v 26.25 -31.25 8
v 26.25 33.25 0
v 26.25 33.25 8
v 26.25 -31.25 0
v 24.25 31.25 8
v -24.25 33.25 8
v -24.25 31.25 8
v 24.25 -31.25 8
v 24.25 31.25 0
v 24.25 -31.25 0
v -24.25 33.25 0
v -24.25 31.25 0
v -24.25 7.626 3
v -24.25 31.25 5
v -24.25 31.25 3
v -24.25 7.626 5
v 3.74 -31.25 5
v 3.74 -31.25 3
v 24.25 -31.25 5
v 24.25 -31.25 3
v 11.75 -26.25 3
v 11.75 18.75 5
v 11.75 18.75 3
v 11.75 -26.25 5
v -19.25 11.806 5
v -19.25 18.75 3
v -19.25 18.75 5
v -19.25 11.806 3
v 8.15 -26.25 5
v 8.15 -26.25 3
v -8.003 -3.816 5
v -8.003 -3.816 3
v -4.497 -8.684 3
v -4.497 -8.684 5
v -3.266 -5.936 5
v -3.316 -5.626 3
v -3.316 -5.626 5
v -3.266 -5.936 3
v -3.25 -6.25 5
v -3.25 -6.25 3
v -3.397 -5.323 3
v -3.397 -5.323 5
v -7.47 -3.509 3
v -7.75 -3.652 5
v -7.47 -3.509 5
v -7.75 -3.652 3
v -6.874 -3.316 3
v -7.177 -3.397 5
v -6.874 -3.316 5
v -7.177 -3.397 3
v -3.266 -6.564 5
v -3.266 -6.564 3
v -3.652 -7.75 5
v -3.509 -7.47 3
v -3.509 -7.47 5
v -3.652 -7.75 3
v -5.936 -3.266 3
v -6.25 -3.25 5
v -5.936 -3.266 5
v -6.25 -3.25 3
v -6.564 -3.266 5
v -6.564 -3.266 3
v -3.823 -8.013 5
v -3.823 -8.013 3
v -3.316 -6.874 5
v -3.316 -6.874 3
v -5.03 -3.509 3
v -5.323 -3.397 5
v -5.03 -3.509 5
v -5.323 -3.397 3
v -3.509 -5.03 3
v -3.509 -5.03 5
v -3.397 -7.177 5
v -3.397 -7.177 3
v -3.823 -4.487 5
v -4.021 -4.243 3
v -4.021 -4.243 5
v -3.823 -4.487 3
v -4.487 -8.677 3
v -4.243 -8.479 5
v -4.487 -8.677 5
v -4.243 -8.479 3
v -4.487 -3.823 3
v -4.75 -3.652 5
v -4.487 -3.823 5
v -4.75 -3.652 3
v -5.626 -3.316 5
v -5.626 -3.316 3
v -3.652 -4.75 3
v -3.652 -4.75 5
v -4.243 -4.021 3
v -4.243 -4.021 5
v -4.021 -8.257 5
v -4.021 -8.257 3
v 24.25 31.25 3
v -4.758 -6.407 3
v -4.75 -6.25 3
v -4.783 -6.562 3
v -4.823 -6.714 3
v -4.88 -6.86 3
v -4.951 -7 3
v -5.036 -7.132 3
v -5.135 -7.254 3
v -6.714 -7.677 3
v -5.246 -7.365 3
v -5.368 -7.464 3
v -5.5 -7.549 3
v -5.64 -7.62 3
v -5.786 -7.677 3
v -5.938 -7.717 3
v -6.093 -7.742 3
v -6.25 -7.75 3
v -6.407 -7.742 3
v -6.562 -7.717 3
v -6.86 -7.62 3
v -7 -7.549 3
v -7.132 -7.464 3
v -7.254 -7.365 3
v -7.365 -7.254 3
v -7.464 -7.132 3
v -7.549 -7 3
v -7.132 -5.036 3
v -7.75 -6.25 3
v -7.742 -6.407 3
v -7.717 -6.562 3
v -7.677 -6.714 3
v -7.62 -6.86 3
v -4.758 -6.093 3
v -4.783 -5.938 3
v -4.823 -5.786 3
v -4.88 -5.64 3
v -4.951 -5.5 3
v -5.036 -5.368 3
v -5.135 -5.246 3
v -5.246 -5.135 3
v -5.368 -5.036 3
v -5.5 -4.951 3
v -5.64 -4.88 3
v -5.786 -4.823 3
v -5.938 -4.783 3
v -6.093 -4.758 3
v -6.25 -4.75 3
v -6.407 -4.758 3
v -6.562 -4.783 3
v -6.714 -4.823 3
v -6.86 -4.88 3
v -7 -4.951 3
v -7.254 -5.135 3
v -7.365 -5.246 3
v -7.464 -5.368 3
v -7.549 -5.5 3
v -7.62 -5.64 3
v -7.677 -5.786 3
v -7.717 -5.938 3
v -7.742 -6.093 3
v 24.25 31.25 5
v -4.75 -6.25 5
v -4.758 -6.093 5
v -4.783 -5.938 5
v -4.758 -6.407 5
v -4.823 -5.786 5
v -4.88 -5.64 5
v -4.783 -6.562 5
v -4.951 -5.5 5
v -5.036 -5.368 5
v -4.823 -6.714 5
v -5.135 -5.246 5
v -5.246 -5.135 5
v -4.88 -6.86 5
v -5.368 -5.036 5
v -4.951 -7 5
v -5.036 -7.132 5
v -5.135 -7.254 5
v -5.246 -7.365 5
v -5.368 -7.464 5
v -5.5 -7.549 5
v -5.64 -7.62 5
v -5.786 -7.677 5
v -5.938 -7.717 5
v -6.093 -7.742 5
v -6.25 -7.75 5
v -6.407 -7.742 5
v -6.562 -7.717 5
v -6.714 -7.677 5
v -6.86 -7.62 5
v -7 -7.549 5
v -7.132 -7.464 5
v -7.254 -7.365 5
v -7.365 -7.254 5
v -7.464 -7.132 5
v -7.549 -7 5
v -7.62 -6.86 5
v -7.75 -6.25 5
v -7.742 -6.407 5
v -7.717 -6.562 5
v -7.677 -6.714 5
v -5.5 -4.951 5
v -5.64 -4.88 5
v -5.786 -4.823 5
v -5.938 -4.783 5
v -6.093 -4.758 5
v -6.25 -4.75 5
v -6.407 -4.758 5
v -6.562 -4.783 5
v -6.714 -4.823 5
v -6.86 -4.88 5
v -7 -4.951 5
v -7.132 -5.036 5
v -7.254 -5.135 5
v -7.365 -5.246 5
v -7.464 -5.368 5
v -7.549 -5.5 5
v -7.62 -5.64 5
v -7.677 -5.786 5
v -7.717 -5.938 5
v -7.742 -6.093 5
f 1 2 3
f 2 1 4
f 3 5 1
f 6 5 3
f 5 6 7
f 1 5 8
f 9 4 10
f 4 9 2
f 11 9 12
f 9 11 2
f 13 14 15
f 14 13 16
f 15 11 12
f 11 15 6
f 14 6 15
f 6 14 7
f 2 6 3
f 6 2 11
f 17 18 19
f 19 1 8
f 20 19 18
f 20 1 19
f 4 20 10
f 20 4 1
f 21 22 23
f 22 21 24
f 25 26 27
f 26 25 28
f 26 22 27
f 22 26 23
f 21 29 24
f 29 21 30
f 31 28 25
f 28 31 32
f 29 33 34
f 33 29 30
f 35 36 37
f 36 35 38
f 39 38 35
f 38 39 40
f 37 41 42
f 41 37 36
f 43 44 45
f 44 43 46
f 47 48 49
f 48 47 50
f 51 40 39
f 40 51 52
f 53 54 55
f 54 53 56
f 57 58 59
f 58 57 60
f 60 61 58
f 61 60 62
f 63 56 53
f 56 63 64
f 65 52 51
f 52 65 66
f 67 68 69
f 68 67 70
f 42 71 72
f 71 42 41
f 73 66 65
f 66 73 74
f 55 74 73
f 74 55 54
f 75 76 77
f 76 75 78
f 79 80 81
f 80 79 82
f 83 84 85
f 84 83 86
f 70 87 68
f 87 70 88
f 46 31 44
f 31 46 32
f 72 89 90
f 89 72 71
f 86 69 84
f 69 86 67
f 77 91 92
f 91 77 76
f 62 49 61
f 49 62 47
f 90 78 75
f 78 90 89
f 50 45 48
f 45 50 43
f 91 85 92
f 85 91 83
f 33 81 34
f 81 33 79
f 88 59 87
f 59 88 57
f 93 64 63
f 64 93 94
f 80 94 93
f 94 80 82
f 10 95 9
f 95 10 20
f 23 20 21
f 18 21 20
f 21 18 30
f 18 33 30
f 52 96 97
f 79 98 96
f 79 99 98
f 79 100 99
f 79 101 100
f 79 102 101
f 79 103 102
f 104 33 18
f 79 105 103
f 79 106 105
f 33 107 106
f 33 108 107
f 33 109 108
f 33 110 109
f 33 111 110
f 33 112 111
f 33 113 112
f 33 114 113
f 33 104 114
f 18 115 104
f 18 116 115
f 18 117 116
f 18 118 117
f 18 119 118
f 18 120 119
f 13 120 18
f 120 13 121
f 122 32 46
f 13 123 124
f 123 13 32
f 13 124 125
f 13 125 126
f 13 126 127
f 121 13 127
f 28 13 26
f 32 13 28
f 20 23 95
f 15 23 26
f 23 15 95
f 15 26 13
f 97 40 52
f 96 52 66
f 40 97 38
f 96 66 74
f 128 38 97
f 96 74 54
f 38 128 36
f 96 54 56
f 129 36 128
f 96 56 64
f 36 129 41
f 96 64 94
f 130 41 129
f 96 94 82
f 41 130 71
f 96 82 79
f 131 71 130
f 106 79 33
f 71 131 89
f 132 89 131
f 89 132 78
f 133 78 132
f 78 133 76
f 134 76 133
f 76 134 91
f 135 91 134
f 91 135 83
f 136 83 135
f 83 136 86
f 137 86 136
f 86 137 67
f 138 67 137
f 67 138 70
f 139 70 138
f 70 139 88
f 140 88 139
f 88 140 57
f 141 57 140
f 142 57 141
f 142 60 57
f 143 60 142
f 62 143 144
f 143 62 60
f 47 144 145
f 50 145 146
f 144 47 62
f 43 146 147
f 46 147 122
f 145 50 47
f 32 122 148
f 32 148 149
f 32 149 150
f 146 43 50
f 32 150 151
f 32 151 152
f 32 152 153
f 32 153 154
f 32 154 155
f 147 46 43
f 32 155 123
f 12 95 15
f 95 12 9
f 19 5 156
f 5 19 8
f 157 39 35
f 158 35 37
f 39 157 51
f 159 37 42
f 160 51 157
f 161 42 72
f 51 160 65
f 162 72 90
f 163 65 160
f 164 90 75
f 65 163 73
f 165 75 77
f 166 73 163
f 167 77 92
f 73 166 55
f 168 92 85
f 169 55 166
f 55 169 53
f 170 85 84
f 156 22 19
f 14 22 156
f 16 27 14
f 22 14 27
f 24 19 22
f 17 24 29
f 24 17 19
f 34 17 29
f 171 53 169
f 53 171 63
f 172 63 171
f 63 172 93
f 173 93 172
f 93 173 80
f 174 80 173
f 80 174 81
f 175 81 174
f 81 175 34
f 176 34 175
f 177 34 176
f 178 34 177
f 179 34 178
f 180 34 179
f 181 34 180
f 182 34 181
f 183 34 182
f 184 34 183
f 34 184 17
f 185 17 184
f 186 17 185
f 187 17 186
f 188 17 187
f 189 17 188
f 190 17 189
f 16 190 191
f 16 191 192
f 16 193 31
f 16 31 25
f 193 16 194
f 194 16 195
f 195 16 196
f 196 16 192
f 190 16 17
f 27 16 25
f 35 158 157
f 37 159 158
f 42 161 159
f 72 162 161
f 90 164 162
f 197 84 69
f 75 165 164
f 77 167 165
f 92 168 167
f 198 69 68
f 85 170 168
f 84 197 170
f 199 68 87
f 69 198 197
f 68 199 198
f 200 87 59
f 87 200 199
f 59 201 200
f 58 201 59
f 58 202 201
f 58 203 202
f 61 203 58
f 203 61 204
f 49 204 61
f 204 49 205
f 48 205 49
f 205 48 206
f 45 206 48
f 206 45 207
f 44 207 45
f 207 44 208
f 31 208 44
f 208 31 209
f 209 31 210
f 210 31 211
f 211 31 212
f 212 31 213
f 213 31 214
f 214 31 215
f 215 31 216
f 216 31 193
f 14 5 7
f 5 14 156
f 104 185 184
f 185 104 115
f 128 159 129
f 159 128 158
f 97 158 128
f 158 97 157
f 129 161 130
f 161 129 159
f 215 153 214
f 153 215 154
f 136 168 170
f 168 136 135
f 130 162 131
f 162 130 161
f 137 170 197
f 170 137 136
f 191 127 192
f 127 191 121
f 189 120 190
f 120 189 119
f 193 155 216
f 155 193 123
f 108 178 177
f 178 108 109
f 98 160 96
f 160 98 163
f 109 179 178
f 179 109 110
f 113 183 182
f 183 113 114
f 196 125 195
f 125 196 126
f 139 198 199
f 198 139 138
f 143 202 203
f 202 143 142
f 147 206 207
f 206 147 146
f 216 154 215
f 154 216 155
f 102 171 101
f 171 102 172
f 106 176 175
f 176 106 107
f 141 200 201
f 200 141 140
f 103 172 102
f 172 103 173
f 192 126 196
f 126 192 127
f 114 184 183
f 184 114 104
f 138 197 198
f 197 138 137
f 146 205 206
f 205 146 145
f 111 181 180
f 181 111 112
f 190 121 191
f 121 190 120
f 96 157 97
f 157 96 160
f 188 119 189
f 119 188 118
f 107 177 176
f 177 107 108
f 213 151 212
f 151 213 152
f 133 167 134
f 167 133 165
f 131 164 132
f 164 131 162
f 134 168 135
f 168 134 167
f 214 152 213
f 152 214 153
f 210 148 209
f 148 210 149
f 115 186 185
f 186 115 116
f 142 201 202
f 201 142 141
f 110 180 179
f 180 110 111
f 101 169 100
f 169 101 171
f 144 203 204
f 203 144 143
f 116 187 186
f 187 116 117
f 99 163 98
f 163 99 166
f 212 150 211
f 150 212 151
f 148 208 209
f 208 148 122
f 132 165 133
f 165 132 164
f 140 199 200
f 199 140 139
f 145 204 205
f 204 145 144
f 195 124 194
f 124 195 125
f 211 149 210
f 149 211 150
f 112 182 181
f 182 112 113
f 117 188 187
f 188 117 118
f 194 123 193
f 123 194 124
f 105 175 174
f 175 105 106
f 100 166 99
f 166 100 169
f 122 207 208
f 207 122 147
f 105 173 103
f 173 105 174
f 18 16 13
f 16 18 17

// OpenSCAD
/*
 * Author:  Marcelo Costa Jr.
 * License: Creative Commons Attribution-ShareAlike 3.0 Unported License
 *          see http://creativecommons.org/licenses/by-sa/3.0/
 * URL:     http://www.thingiverse.com/thing:142382
 */

// MakerBot customizer settings:
// preview[view:south east, tilt:top diagonal]

/*
 * parameters
 */

/* [parameters] */
// spacing from edge of table on the X axes (mm)
	xEsp = 12.5; 
// spacing from edge of table on the Y axes (mm)
	yEsp = 12.5; 
// dimensions of leg on the X axes (mm)
	xLeg = 36;
// dimensions of leg on the Y axes (mm)	
	yLeg = 50;
// diameter of drilling hole (mm)
	hDia = 3;// [3:12]
	
/*[hidden]*/
	hRad = hDia/2;
// a little trigonometry
	alpha = atan2(yLeg,xLeg);
	dY = (hRad+5)/cos(alpha);
	dX = (hRad+5)/sin(alpha);

// quality of the circles
$fn=60;

// edge spacer
module spacer() {
	difference() {
		// full volume
		cube([xEsp+xLeg+2,yEsp+yLeg+2,8]);
		// subtration (leg)
		translate([5,5,-1])
			cube([xLeg-5,yLeg-5,10]);
	}
}

// transversal support of drill guide
module transversal() {
	difference (){
		translate([0,0,0])
			linear_extrude(height = 8, center = false, convexity = 10, twist = 0)
				polygon(points = [[0,0],[0,yLeg],[xLeg,0]]);
	}
}
// drill guide
module drill() {
	translate([xLeg/2,yLeg/2,0])
		cylinder(h=8, r=hDia);
}

//	cuts 
module cutUpDow(){
	// subtration (downer cut)
	translate([-1,-1,-1])
		cube([xEsp+xLeg+1,yEsp+yLeg+1,4]);
	// 2nd subtration (upper cut)
	translate([-1,-1,3+2])
		cube([xEsp+xLeg+1,yEsp+yLeg+1,4]); 

}
module cutSlant() {
	translate([0,0,0])
		linear_extrude(height = 10, center = false, convexity = 10, twist = 0)
			polygon(points = [[-1,-1],[0,yLeg-dY],[xLeg-dX,0]]);
}
module cutHole() {
	translate([xLeg/2,yLeg/2,-1])
		cylinder(h=10, r=hDia/2);
}

// The actual sequence of actions
translate([-(xLeg+xEsp)/2,-(yLeg+yEsp)/2,0])
	difference(){
		union(){
			spacer();
			transversal();
			drill();
		}
		cutHole();
		cutUpDow();
		cutSlant();
	}
